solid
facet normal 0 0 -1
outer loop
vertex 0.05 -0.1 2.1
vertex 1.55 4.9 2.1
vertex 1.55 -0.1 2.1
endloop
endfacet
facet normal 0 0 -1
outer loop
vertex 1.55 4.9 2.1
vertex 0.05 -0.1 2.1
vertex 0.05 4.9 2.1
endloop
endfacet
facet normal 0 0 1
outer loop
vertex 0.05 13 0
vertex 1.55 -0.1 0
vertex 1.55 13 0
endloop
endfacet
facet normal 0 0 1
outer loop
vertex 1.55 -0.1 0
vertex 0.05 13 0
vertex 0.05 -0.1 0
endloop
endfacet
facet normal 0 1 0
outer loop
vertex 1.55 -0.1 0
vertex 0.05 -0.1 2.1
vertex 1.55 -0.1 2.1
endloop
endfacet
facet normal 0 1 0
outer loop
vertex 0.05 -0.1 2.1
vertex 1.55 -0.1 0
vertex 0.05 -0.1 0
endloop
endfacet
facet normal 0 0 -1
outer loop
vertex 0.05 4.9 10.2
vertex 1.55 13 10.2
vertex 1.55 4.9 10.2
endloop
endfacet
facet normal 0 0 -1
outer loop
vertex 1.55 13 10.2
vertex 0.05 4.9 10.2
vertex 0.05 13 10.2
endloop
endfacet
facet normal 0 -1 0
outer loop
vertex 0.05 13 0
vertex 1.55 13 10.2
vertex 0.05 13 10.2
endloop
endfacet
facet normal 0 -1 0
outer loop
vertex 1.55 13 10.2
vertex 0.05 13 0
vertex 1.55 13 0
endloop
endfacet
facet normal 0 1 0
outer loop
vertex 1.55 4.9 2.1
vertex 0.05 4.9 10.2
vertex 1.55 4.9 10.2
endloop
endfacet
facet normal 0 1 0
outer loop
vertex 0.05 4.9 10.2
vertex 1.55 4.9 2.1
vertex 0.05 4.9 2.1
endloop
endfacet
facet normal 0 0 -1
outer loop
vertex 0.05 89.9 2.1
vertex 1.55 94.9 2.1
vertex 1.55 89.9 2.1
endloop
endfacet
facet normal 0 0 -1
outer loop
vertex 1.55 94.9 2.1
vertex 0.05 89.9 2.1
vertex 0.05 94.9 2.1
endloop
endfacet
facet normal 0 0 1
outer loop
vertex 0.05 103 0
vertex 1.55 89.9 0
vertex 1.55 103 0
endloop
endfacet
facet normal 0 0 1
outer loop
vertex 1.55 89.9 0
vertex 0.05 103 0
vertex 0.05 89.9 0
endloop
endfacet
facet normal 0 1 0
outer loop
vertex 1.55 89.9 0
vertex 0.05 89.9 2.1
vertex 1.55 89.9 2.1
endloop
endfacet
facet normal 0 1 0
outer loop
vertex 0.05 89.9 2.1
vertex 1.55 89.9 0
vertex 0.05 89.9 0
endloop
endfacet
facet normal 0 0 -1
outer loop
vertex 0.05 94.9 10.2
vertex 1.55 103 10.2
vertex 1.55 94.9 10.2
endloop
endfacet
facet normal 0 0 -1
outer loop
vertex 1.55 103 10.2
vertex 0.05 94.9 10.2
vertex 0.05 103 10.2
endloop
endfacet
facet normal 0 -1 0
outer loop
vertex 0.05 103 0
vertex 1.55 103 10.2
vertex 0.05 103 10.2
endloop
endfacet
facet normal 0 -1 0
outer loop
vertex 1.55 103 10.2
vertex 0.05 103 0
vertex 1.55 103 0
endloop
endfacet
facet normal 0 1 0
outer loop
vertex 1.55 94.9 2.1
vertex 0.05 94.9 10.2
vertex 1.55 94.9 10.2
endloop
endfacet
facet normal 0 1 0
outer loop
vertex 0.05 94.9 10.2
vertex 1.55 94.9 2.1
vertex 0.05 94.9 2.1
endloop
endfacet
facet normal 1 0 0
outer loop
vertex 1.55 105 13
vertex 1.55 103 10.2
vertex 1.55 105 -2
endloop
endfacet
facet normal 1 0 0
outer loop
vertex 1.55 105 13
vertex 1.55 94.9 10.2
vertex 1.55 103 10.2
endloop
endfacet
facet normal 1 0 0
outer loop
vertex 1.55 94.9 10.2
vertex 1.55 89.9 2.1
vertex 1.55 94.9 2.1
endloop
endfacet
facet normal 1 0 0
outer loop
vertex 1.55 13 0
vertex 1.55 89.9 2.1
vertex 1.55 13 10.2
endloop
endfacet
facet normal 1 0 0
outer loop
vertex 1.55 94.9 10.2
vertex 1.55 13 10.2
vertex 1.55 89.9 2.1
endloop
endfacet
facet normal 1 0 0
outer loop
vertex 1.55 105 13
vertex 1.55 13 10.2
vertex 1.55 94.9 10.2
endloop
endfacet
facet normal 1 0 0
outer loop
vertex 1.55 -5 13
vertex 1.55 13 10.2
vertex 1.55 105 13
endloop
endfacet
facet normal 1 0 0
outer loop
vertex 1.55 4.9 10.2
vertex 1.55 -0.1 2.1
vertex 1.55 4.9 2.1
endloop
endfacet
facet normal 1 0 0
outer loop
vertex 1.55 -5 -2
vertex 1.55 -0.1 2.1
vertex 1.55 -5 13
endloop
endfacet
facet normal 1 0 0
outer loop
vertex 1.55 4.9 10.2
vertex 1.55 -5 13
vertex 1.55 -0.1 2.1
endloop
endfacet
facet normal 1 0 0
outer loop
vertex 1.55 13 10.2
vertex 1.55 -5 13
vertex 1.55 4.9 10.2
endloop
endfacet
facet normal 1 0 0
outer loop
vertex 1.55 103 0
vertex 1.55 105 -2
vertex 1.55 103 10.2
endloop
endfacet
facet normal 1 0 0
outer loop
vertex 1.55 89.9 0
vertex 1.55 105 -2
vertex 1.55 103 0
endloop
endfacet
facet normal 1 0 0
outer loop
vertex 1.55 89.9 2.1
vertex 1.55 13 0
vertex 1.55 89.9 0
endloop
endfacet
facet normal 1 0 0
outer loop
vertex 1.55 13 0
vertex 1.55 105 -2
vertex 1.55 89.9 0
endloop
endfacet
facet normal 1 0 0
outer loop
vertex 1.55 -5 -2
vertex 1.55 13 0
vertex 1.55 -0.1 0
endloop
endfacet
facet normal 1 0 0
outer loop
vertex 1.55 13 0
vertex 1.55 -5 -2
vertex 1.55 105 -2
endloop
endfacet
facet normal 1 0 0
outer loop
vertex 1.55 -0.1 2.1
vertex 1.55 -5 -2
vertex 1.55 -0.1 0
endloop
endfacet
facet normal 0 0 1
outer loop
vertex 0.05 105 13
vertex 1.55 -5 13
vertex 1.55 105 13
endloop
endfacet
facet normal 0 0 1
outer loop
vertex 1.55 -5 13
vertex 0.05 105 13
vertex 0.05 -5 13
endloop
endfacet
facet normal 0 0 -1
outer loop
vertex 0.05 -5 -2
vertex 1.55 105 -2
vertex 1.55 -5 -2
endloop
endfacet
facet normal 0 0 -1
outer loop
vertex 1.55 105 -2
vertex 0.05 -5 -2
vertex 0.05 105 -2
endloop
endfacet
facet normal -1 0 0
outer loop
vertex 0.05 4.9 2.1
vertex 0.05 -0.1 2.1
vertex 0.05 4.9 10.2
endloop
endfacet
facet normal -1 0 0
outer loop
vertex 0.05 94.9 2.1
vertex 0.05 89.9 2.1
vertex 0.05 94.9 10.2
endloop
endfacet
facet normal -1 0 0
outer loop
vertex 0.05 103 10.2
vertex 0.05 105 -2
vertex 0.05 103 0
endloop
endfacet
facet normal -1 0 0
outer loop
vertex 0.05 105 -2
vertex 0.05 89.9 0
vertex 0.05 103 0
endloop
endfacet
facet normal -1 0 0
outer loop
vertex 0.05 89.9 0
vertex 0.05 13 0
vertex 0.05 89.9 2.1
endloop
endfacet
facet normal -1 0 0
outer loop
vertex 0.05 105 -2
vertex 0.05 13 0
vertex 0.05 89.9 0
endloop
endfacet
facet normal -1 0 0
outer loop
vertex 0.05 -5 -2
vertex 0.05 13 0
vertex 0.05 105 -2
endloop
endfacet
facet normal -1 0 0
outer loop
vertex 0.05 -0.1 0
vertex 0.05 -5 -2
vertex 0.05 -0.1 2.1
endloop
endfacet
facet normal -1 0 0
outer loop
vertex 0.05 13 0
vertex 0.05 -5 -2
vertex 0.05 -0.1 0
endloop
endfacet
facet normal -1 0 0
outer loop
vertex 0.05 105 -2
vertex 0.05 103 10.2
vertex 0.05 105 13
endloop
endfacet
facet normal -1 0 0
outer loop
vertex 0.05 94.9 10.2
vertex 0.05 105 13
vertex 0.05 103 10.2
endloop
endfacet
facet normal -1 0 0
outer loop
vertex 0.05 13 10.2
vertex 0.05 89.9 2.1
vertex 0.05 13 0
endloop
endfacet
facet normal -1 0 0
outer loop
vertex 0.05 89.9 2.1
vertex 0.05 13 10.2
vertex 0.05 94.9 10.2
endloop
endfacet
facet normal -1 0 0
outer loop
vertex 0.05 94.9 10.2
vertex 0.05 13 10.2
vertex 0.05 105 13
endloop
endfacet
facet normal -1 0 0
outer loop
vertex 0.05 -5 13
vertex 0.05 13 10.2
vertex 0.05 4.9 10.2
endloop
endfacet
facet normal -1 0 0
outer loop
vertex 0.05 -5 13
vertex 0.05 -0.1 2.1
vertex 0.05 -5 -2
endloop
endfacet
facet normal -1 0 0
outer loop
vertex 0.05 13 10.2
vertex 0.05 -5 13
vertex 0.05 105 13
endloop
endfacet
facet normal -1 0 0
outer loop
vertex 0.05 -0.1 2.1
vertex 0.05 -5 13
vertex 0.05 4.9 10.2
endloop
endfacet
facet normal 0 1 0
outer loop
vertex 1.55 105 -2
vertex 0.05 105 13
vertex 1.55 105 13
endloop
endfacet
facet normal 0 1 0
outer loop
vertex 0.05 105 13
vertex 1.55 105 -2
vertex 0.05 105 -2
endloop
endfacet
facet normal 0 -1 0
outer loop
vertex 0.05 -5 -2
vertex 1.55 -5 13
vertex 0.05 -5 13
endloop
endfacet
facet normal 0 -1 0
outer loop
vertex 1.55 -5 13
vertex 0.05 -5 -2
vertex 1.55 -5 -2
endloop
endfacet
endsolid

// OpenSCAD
module track_foot(base_height_mm = 2.1) {
    standoff_width_mm = 2;
    standoff_length_mm = 3;
    key_width_mm = 2;
    key_length_mm = 8.1;
    total_width_mm = standoff_width_mm + key_width_mm;
    total_length_mm = key_length_mm;
    
    foot_height_mm = base_height_mm + 8.1;
    
    union(){
        // base
        translate([0,standoff_length_mm - key_length_mm,0])
            cube([total_width_mm,total_length_mm,base_height_mm]);
        // standoff
        cube([standoff_width_mm,standoff_length_mm,foot_height_mm]);
        // key
        translate([standoff_width_mm,standoff_length_mm - key_length_mm,0])
            cube([key_width_mm,key_length_mm,foot_height_mm]);
    }
    
}

module key_hole() {
    translate([0, 5, 0])
        track_foot();

    translate([-2, 10, 0])
        track_foot();
}


difference(){
    translate([0.05, -5,-2])
        cube([1.5,110,15]);

    translate([0, 0, 0])
    key_hole();
    
    translate([0, 90, 0])
    key_hole();
}

//    translate([15, 15, 0])
//        track_foot();
